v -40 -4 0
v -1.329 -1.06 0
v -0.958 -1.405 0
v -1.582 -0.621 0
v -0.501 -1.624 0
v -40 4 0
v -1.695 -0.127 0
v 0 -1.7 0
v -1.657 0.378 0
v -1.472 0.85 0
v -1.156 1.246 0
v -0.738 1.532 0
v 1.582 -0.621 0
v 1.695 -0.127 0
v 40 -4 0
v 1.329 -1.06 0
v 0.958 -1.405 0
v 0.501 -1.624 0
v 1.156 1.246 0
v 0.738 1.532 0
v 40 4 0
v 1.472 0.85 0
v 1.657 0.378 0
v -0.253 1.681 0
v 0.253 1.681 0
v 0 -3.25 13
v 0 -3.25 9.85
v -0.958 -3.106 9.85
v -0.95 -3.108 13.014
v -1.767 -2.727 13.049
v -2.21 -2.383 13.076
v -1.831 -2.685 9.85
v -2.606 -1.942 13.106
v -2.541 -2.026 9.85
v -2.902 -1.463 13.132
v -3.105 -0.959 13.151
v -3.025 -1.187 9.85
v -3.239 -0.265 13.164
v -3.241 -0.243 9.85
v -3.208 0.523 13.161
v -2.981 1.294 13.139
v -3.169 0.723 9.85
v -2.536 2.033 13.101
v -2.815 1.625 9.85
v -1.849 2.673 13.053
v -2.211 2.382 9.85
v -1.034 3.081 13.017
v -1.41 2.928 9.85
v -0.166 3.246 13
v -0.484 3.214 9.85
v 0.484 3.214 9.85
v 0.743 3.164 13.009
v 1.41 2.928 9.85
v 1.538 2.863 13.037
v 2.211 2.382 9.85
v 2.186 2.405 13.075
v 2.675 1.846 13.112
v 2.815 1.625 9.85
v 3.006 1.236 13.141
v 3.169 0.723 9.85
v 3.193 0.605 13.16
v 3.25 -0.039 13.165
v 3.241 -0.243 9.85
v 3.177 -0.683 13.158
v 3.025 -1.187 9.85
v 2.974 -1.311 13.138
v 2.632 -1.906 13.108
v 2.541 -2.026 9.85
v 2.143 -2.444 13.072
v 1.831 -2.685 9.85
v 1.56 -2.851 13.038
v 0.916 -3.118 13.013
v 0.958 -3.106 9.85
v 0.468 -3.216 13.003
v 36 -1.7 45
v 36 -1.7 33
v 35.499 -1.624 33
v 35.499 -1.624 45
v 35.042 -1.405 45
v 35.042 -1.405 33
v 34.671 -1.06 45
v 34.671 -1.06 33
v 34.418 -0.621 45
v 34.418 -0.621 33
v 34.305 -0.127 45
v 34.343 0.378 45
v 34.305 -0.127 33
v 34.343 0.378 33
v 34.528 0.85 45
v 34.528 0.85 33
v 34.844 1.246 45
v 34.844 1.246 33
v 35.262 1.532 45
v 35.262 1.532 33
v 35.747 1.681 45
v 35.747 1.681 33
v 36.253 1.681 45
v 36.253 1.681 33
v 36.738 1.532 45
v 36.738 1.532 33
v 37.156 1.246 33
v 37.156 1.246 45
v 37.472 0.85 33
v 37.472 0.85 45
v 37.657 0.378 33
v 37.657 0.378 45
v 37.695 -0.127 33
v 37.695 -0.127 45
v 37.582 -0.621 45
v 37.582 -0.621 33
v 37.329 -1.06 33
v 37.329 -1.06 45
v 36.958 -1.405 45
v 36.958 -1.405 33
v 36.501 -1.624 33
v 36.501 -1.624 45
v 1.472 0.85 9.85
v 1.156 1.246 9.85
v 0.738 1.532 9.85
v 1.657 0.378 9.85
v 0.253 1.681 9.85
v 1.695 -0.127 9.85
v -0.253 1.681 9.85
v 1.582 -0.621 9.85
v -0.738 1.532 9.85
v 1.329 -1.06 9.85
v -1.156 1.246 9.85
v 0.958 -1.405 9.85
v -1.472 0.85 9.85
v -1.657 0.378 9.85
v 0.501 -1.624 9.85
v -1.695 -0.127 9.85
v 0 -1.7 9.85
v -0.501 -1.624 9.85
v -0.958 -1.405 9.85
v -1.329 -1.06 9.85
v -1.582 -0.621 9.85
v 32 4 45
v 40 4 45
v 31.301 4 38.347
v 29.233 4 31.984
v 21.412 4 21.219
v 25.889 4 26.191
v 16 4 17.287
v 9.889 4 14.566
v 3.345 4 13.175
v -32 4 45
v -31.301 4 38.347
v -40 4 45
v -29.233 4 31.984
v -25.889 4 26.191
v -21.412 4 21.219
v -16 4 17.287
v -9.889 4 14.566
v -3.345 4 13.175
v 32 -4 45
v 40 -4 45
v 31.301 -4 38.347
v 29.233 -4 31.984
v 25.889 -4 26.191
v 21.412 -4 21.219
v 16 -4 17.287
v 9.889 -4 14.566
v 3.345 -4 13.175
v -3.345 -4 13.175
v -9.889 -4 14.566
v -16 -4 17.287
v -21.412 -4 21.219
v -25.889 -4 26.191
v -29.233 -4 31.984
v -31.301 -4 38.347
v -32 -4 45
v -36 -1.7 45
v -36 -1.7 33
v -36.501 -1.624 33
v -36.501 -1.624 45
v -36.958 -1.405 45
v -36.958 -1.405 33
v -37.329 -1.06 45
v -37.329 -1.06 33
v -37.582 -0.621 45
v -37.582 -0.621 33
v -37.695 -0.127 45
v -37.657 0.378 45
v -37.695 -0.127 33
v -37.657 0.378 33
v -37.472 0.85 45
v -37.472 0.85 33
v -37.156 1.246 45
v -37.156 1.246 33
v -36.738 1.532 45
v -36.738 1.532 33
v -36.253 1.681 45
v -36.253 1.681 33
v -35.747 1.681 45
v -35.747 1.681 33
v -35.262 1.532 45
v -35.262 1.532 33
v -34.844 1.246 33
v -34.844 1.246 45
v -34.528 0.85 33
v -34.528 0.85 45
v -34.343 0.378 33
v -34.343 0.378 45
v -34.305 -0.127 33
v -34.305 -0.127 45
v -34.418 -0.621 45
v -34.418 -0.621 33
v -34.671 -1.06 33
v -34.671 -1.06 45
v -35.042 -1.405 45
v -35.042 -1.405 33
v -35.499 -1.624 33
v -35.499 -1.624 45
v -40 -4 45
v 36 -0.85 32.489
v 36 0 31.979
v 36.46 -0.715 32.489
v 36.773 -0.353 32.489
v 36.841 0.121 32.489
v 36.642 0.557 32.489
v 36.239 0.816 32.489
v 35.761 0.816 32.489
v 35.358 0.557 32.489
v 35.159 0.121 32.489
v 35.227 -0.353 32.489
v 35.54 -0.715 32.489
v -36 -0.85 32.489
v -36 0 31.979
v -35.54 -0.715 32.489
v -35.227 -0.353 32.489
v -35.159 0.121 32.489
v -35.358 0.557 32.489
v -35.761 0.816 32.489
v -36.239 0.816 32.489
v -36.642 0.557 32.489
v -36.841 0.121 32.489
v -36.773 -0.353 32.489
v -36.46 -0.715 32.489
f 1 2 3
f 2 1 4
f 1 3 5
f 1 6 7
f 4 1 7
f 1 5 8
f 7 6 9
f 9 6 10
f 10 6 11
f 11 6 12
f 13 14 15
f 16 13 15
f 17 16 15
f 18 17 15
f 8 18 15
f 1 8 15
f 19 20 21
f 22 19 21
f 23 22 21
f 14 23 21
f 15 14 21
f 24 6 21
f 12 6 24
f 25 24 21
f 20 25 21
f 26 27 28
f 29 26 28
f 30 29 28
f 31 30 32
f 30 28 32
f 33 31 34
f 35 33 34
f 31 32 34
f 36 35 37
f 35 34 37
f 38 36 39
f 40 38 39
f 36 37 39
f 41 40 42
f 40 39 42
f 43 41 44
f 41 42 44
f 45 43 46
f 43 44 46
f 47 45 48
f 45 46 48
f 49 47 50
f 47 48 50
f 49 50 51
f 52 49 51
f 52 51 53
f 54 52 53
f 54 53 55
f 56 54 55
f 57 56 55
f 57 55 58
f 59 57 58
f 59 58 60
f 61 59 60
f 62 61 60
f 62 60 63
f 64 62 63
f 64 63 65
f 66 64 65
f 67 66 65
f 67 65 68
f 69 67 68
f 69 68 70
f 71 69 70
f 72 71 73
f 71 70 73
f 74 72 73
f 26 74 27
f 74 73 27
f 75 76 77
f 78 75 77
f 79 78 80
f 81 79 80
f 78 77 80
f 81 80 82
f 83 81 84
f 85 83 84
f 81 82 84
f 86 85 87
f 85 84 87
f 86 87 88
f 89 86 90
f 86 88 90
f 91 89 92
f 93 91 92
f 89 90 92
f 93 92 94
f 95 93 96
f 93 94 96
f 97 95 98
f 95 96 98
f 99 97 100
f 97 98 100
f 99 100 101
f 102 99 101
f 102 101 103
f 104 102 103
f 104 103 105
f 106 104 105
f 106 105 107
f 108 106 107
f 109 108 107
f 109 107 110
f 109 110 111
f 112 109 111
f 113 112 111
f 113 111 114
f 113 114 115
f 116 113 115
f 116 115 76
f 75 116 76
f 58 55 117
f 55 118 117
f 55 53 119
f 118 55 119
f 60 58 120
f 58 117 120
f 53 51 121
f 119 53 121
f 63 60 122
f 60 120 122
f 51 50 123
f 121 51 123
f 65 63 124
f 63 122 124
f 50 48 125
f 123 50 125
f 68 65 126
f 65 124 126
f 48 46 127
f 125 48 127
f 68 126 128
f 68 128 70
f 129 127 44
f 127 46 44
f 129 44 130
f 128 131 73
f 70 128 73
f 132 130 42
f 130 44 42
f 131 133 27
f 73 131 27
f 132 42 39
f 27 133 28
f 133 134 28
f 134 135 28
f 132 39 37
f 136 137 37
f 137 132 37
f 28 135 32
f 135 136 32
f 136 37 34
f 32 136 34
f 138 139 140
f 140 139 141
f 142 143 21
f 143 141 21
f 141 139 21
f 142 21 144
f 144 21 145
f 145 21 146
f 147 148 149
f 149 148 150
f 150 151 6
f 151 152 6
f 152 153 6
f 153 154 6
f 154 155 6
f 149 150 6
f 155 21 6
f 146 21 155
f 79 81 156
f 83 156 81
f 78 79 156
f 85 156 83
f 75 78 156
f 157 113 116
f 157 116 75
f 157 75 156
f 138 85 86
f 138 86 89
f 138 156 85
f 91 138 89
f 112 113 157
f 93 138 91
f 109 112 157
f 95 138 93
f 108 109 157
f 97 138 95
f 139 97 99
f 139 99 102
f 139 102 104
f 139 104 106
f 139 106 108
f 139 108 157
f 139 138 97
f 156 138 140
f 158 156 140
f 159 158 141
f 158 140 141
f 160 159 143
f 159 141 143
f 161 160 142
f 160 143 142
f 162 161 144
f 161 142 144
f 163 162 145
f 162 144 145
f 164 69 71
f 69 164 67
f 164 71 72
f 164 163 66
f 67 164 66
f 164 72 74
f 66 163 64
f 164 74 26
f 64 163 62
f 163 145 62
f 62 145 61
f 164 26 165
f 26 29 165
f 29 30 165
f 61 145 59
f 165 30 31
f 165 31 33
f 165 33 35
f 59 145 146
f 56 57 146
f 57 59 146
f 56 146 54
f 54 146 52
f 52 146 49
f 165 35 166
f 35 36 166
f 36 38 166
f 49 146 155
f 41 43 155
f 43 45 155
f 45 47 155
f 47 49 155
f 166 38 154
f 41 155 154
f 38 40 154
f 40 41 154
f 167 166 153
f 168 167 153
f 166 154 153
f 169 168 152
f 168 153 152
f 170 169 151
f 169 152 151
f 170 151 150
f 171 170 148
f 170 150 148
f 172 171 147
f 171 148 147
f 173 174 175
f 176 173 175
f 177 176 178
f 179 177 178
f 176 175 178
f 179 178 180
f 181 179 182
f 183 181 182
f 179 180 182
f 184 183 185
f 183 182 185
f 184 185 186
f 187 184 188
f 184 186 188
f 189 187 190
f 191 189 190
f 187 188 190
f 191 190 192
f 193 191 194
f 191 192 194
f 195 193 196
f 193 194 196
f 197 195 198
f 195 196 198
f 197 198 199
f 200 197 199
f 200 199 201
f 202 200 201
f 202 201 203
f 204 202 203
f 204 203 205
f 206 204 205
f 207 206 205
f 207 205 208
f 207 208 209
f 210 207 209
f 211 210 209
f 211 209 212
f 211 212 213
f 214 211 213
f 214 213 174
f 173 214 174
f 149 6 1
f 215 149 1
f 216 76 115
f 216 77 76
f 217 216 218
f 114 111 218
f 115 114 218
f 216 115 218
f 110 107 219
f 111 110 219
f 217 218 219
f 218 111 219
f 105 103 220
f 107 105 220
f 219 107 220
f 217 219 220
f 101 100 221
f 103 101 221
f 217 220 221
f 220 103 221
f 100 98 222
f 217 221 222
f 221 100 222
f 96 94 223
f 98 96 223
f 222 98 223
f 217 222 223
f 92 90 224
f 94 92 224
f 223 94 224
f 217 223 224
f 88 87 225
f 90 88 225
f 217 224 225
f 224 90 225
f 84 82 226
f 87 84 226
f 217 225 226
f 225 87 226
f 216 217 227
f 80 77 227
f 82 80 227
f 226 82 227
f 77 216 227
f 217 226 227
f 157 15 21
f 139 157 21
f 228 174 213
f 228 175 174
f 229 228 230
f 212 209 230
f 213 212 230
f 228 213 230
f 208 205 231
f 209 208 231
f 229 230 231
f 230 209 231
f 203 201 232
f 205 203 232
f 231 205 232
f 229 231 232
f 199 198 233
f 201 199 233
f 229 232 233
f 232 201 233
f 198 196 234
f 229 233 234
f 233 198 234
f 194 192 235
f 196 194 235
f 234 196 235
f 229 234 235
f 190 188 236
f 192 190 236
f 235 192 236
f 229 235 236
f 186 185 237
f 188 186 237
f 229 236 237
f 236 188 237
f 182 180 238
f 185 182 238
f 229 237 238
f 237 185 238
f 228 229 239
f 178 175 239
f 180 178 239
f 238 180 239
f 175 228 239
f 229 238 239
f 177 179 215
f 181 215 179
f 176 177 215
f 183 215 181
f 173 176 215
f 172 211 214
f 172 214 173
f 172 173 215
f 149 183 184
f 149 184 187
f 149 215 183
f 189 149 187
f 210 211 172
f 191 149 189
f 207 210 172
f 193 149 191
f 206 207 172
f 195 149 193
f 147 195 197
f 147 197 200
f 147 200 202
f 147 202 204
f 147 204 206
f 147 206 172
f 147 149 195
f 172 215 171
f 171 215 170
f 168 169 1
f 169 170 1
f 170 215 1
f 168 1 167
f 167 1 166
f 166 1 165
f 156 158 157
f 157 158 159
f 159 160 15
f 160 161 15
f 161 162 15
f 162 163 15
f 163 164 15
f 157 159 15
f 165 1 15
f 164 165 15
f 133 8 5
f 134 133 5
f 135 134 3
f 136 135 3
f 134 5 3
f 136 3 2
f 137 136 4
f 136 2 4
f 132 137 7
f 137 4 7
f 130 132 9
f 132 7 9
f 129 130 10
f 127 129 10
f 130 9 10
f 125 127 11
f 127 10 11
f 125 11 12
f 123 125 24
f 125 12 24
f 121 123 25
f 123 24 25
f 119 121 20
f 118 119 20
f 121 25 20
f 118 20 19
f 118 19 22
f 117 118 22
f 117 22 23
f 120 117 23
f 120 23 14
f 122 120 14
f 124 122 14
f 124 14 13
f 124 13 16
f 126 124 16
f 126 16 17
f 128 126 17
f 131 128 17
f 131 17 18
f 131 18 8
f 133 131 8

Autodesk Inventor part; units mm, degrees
ref_plane "YZ Plane" through (0, 0, 0) normal (1, 0, 0) x (0, 1, 0)
ref_plane "XZ Plane" through (0, 0, 0) normal (0, 1, 0) x (-1, 0, 0)
ref_plane "XY Plane" through (0, 0, 0) normal (0, 0, 1) x (1, 0, 0)
sketch "Sketch1" plane through (0, 0, 0) normal (0, 0, 1) x (1, 0, 0)
  line L0 (-40, -4) -> (40, -4)
  line L1 (40, -4) -> (40, 4)
  line L2 (40, 4) -> (-40, 4)
  line L3 (-40, 4) -> (-40, -4)
  line L4 (-40, -4) -> (40, 4) construction
  line L5 (40, -4) -> (-40, 4) construction
  point P0 (0, 0)
  dimension "d0" = 80
  dimension "d1" = 8
extrude "Extrusion1" add sketch "Sketch1" along normal blind 45
sketch "Sketch2" plane through (-40, 4, 0) normal (0, 1, 0) x (1, 0, 0)
  line L0 (80, -45) -> (0, -45) projected
  circle A0 centre (40, -45) radius 32
  point P0 (40, 0)
  dimension "d4" = 64
extrude "Extrusion2" cut sketch "Sketch2" against normal through all
ref_plane "Work Plane1" through (0, 0, 13.25) normal (0, 0, -1) x (-1, 0, 0)
sketch "Sketch3" plane through (0, 0, 13.25) normal (0, 0, -1) x (-1, 0, 0)
  point P0 (0, 0)
  point P1 (0, 0)
hole "Hole1" at (0, 0, 13.25) direction (0, 0, -1) diameter 3.4 end through all counterbore diameter 6.5 counterbore depth 3.4 clearance for "Socket Head Cap Screw DIN EN ISO 4762" size "M3" standard "DIN"
sketch "Sketch4" plane through (0, 0, 45) normal (0, 0, 1) x (1, 0, 0)
  line L0 (40, -4) -> (40, 4) projected
  line L1 (-40, 4) -> (-40, -4) projected
  point P0 (0, 0)
  point P1 (36, 0)
  point P2 (-36, 0)
  dimension "d15" = 4
  dimension "d16" = 4
hole "Hole2" at (36, 0, 45) at (-36, 0, 45) direction (0, 0, -1) diameter 3.4 depth 12 tip angle 118 clearance for "Socket Head Cap Screw DIN EN ISO 4762" size "M3" standard "DIN"
properties part number "Cap_Holder_1"
